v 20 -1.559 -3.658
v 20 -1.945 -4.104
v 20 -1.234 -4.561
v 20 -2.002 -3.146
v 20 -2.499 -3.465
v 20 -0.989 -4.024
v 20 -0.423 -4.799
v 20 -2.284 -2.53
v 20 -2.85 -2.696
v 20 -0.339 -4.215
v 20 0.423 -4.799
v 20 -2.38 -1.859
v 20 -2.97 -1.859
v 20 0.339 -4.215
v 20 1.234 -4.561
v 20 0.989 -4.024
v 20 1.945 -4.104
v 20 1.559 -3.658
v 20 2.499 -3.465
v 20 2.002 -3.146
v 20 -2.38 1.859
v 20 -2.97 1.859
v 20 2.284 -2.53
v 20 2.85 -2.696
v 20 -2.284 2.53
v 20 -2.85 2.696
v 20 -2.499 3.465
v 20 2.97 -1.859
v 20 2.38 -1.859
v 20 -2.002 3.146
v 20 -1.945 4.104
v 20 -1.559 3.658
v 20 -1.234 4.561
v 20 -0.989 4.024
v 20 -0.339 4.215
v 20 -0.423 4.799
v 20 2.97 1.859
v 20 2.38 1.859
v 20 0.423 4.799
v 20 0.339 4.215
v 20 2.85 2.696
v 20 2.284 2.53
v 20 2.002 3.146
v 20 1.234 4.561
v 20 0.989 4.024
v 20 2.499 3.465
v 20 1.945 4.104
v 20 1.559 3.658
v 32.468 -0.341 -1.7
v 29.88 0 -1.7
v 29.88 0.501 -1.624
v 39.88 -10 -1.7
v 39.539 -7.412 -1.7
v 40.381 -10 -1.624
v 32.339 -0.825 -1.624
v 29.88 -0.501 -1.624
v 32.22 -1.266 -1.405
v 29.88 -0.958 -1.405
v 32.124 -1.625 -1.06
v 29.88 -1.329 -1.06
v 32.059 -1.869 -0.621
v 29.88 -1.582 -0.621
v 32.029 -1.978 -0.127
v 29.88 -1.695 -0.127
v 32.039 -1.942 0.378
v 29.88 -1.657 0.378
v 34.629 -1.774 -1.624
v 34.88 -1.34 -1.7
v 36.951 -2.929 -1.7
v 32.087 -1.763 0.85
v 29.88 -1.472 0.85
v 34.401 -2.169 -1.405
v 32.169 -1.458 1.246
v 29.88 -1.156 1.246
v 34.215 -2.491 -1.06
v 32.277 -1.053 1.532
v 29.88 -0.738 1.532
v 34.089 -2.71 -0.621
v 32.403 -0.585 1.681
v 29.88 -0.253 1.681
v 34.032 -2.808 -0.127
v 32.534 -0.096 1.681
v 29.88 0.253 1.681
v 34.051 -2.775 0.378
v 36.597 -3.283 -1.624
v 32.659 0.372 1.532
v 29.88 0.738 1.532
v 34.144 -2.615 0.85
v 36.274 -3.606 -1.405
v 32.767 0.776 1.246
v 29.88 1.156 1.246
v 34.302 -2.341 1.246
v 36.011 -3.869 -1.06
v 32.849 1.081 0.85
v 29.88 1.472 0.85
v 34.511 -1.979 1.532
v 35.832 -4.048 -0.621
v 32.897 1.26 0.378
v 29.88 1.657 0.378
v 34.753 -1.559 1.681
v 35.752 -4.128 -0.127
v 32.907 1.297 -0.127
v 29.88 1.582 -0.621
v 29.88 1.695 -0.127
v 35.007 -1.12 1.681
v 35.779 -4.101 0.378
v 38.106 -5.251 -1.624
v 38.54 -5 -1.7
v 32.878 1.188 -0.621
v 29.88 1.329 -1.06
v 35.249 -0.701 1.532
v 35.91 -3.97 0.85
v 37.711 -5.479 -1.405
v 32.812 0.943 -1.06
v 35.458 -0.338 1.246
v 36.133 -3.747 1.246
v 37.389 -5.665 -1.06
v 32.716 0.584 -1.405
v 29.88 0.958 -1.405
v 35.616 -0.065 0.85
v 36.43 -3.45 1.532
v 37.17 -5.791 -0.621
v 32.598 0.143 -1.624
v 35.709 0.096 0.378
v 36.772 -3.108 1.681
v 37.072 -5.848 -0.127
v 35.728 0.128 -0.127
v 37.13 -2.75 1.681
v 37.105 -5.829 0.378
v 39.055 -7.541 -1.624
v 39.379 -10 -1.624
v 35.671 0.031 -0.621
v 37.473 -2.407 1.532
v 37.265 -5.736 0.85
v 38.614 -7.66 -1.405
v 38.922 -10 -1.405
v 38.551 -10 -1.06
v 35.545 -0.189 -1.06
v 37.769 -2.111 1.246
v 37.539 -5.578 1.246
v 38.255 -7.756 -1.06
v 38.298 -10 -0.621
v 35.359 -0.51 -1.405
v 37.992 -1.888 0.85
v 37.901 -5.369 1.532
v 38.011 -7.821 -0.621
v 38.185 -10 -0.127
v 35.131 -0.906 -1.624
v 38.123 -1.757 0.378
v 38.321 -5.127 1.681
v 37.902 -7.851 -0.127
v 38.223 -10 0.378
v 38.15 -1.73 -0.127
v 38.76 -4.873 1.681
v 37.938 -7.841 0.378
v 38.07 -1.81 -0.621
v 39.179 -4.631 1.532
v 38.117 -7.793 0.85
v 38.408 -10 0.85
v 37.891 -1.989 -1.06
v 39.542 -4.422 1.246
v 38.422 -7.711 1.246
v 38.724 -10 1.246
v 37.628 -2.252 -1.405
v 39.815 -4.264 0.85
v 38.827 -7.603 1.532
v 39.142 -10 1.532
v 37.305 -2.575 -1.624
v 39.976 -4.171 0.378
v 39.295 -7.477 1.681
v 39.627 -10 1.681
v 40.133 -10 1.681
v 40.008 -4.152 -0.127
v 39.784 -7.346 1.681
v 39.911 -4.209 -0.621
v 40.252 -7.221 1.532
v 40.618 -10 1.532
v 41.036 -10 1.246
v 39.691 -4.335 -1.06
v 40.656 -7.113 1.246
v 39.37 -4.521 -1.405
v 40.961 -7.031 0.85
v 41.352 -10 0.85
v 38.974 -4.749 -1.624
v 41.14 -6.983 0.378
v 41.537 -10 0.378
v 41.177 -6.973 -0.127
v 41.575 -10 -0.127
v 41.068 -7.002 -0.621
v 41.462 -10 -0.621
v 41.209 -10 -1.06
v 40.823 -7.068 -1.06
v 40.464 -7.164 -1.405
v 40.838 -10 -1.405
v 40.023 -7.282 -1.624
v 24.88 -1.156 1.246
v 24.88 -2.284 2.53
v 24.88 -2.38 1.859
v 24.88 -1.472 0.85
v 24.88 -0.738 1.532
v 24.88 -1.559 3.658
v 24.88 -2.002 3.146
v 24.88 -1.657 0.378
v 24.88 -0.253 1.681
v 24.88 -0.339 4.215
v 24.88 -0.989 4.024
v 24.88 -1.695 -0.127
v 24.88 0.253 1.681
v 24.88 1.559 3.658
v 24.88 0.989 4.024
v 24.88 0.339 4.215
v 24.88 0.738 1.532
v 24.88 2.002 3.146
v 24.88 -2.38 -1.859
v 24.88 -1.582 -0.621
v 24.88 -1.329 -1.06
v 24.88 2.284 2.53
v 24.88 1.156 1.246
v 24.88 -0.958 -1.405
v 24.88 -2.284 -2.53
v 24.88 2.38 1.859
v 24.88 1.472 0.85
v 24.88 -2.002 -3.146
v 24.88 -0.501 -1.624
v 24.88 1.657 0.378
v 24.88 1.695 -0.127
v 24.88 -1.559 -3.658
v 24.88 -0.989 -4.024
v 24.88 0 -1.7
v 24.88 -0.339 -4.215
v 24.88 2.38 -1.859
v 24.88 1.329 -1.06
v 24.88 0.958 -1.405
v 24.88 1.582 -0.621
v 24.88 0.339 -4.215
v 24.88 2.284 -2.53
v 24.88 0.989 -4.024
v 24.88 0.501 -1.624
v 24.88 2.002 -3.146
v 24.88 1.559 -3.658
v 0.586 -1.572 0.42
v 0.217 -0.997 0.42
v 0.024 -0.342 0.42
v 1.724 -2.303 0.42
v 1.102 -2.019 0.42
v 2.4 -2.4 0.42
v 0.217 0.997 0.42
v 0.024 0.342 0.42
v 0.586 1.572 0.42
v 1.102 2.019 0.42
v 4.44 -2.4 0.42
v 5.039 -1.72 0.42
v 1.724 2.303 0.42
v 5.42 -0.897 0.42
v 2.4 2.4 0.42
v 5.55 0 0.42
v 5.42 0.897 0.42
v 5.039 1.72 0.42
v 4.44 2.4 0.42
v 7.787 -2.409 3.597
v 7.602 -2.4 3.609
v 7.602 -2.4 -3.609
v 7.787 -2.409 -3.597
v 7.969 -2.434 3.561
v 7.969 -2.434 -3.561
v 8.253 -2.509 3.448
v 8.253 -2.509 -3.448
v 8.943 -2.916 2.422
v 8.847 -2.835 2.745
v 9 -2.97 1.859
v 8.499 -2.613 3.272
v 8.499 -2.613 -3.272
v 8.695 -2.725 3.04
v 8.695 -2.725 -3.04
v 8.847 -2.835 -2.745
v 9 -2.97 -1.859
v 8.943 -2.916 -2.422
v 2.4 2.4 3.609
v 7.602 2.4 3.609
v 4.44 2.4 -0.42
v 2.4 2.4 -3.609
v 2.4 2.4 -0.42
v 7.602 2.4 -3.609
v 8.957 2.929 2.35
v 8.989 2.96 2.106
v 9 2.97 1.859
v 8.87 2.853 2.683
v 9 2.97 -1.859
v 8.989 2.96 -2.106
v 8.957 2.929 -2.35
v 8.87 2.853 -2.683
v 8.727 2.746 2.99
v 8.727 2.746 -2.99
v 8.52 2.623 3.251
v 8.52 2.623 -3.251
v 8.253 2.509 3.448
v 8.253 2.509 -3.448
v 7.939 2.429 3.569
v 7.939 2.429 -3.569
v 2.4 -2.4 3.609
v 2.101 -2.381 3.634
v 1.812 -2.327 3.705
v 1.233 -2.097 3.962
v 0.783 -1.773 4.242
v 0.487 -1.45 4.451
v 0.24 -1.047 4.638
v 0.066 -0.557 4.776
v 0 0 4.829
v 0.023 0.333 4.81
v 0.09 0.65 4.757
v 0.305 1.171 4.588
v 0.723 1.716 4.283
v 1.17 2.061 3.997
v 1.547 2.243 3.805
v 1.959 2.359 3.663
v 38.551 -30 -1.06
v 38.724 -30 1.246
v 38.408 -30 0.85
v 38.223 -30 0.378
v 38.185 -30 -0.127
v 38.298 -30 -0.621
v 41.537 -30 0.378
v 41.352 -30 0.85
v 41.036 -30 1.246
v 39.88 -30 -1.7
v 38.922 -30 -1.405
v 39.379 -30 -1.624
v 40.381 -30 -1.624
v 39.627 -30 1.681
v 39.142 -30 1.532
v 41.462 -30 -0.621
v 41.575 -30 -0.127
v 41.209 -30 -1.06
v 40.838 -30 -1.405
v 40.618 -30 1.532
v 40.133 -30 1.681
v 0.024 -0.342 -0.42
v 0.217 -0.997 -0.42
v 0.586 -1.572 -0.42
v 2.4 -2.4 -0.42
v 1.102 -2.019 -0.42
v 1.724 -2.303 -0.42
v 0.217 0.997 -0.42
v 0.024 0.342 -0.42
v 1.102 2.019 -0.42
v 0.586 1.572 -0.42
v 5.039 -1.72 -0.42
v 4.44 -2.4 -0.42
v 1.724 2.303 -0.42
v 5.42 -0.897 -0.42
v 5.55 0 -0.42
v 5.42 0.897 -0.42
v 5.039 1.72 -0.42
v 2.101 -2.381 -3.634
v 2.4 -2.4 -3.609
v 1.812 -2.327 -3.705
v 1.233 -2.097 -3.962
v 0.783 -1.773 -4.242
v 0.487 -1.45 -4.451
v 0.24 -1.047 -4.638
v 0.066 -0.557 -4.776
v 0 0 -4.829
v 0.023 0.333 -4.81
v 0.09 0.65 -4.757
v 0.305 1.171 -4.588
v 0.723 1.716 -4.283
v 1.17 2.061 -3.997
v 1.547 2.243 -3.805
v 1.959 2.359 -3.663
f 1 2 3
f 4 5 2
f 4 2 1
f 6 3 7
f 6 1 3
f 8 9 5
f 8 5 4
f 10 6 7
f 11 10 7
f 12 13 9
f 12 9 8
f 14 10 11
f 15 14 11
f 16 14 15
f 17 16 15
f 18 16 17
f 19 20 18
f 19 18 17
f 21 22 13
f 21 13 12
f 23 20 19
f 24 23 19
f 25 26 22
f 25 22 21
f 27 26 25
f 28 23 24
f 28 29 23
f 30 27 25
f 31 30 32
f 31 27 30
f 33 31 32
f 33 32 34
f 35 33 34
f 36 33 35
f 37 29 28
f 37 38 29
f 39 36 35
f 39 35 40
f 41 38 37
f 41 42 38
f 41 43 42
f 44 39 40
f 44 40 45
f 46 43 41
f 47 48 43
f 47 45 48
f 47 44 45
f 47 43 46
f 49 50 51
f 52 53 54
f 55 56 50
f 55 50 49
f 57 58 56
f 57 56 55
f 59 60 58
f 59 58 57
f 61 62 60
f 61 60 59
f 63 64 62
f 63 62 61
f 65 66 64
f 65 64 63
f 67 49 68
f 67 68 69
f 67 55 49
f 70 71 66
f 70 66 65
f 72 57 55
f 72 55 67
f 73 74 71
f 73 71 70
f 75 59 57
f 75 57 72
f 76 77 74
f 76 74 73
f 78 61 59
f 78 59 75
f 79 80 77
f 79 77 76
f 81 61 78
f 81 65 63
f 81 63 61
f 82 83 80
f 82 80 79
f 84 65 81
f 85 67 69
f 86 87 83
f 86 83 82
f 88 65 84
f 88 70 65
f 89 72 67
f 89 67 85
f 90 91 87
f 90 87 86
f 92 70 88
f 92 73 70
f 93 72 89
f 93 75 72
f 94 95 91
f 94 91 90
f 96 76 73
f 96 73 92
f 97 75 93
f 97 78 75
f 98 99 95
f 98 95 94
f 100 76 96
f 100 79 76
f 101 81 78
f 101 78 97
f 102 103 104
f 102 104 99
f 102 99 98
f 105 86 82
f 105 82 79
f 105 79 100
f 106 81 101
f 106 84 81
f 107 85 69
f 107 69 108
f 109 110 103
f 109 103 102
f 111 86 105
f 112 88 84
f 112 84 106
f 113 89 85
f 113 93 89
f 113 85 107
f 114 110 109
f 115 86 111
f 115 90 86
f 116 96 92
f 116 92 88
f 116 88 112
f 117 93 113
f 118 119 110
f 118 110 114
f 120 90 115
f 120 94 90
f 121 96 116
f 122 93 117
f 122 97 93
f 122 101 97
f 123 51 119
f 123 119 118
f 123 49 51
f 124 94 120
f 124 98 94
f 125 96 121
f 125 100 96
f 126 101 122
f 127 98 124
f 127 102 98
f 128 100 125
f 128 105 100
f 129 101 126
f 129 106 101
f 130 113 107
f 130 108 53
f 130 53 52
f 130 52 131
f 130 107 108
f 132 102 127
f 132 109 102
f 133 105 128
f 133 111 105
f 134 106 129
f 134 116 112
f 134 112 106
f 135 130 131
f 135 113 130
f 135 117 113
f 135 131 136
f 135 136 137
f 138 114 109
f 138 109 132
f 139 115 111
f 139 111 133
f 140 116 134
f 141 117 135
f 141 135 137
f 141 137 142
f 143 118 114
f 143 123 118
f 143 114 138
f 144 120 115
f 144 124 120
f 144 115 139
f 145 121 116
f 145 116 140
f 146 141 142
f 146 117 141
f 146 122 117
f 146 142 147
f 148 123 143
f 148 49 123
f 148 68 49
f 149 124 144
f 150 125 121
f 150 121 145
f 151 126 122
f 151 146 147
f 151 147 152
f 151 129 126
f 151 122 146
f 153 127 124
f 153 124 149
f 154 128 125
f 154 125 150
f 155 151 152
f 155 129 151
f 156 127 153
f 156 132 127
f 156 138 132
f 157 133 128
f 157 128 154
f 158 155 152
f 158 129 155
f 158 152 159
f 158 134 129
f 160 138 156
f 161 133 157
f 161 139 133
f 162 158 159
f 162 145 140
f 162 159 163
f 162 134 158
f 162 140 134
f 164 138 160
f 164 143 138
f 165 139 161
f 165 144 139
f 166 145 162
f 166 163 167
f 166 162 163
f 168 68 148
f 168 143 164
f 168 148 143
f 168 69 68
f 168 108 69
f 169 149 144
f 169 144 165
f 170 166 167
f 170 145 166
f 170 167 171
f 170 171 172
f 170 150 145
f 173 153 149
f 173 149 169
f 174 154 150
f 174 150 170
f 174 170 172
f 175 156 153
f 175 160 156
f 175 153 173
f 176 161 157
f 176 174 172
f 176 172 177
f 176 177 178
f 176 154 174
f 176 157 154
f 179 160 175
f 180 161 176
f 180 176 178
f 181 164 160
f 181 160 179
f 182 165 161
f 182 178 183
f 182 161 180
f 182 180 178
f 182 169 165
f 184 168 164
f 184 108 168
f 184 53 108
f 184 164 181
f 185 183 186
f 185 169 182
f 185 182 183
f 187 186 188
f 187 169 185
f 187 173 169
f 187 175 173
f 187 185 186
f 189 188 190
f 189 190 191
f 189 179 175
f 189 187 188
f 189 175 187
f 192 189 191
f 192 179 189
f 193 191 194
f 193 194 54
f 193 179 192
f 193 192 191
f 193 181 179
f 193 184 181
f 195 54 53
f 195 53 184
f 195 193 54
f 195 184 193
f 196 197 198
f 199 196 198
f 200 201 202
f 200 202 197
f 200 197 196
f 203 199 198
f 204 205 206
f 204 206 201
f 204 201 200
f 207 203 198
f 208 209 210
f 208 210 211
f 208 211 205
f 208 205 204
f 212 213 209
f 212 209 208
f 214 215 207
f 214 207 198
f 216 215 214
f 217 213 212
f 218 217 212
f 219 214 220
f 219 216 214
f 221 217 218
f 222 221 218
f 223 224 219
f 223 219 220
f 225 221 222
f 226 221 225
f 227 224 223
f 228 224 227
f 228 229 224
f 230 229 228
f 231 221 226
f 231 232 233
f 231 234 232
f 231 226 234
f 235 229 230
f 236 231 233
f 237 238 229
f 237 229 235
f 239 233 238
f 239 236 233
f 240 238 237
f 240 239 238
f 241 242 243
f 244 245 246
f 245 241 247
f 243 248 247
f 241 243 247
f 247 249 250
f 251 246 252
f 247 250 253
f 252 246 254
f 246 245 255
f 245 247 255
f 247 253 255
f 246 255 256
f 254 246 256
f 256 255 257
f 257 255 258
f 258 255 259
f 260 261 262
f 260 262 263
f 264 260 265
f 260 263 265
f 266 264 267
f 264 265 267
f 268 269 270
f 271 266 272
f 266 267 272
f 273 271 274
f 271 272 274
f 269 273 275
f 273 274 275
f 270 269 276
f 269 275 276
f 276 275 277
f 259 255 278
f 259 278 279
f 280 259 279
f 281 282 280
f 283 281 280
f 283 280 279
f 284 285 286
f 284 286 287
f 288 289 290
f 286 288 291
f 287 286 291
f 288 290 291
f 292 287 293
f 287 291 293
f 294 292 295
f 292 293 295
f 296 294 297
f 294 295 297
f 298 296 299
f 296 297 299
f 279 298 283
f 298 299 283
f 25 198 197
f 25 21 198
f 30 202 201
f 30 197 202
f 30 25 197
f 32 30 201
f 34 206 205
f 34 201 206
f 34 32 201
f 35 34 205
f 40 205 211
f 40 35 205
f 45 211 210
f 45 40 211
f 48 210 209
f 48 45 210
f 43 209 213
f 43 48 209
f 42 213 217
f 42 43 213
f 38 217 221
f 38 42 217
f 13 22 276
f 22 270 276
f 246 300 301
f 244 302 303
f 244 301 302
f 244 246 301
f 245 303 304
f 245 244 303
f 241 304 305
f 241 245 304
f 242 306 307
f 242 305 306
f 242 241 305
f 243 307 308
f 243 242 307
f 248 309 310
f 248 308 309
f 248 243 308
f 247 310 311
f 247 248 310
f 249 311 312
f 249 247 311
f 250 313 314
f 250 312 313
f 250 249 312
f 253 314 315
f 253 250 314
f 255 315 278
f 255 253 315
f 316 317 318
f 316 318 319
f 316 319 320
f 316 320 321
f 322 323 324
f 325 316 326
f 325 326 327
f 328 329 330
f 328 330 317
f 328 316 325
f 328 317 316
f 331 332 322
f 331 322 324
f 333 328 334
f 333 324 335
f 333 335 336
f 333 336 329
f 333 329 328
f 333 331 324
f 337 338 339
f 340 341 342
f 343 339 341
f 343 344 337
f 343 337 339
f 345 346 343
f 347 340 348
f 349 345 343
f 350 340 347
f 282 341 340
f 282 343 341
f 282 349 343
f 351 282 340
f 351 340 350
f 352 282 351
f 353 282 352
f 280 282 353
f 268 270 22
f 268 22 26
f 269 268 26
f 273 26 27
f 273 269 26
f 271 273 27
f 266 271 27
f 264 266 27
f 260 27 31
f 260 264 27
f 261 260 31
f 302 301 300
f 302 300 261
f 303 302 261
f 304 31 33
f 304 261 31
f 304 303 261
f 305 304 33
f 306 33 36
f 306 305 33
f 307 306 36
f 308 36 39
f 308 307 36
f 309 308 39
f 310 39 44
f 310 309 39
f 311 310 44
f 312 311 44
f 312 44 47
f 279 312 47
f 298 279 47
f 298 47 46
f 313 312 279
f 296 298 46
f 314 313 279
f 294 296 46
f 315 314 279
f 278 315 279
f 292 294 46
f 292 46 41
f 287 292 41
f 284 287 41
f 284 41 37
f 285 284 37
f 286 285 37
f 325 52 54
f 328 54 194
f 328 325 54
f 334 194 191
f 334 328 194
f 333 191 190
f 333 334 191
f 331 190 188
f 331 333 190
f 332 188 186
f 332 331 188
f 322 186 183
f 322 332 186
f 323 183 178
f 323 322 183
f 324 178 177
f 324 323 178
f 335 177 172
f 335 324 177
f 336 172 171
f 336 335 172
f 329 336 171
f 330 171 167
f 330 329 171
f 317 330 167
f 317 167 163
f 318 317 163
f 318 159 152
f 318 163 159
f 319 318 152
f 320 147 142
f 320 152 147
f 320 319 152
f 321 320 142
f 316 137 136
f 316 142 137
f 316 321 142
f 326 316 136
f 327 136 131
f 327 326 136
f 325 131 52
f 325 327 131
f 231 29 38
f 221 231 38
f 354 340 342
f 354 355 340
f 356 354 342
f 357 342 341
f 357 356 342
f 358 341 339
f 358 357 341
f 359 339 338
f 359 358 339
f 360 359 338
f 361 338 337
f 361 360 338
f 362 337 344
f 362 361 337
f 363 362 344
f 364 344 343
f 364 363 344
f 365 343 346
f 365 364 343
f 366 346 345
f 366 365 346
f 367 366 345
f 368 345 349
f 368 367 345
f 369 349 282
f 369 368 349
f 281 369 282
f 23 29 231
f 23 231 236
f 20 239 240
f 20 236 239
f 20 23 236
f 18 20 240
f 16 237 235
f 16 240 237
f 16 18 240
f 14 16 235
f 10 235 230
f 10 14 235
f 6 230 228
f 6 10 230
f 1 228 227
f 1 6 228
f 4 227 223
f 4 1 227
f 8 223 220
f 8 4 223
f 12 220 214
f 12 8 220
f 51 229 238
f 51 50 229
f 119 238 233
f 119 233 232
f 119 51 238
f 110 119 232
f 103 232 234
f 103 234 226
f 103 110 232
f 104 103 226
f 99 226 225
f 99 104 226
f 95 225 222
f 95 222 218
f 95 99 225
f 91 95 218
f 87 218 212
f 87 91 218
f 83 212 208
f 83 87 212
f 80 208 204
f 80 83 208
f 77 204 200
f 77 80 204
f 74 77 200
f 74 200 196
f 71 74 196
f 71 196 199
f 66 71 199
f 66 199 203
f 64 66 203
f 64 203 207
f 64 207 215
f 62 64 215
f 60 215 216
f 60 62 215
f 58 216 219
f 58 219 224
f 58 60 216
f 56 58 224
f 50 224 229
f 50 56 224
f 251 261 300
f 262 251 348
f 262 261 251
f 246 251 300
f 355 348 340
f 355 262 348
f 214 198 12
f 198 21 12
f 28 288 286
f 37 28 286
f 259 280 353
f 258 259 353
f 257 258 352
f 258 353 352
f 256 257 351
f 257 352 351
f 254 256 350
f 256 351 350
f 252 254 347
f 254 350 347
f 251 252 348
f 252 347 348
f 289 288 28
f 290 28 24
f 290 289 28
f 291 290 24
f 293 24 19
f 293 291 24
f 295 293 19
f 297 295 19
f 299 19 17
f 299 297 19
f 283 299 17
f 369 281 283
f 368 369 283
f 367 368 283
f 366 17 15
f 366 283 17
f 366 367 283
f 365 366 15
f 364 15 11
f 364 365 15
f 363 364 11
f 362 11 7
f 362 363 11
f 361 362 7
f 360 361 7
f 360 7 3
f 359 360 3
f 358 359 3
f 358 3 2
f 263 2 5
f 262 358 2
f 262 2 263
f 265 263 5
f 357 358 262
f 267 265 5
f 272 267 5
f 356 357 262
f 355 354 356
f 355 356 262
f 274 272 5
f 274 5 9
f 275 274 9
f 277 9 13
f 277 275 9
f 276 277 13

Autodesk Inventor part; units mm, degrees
ref_plane "YZ Plane" through (0, 0, 0) normal (1, 0, 0) x (0, 1, 0)
ref_plane "XZ Plane" through (0, 0, 0) normal (0, 1, 0) x (-1, 0, 0)
ref_plane "XY Plane" through (0, 0, 0) normal (0, 0, 1) x (1, 0, 0)
sketch "草圖1" plane through (0, 0, 0) normal (1, 0, 0) x (0, 1, 0)
  line L0 (-2.97, -1.859) -> (2.97, -1.859)
  line L1 (2.97, -1.859) -> (2.97, 1.859)
  line L2 (2.97, 1.859) -> (-2.97, 1.859)
  line L3 (-2.97, 1.859) -> (-2.97, -1.859)
  line L4 (-2.97, -1.859) -> (2.97, 1.859) construction
  line L5 (2.97, -1.859) -> (-2.97, 1.859) construction
  circle A0 centre (0, 1.859) radius 2.97
  circle A1 centre (0, -1.859) radius 2.97
  line L6 (-2.2651, -3.78) -> (-2.2651, 3.78) construction
  point P0 (0, 0)
  point P1 (-2.97, 1.859)
  dimension "d0" = 7.56
  dimension "d1" = 5.94
extrude "擠出1" add sketch "草圖1" along normal blind 20
sketch "草圖2" plane through (0, 0, 0) normal (0, 0, 1) x (1, 0, 0)
  line L0 (0, 2.4) -> (9, 2.4)
  line L1 (9, 2.4) -> (9, -2.4)
  line L2 (9, -2.4) -> (0, -2.4)
  line L3 (0, -2.4) -> (0, 2.4)
  line L4 (0, -2.97) -> (0, 2.97) projected
  circle A0 centre (2.4, 0) radius 2.4
  line L5 (9, 5) -> (20, 5)
  line L6 (20, 5) -> (20, -5)
  line L7 (20, -5) -> (9, -5)
  line L8 (9, -5) -> (9, 5)
  line L9 (0, -2.97) -> (0, 2.97) projected
  line L10 (0, 2.97) -> (20, 2.97) projected
  line L11 (20, -2.97) -> (20, 2.97) projected
  line L12 (0, -2.97) -> (20, -2.97) projected
  arc A1 (7.6018, 2.4) -> (9, 2.97) centre (7.6018, 4.4) ccw
  arc A2 (9, -2.97) -> (7.6018, -2.4) centre (7.6018, -4.4) ccw
  point P0 (0, 0)
  point P1 (0, 0)
  point P2 (9, 0)
  point P3 (2.4, 2.4)
  point P4 (2.4, -2.4)
  dimension "d4" = 4.8
  dimension "d5" = 9
  dimension "d6" = 2
  dimension "d7" = 2
extrude "擠出2" cut sketch "草圖2" along normal mid plane 20 contours A1 L8 L0 | L0 L1 L2 A0 | L8 L10 L6 L12 L1 | A0 | L8 L5 L6 L10 | L8 A2 L2 | L12 L6 L7 L8 keep common part
sketch "草圖3" plane through (0, 0, 0) normal (0, 0, 1) x (1, 0, 0)
  line L0 (-0.1991, -1.7797) -> (-0.0573, 1.9709) projected
  arc A0 (-0.1991, -1.7797) -> (-0.0573, 1.9709) centre (2.4, 0) ccw projected
  point P0 (0, 0)
extrude "擠出3" cut sketch "草圖3" along normal mid plane 0.84
sketch "草圖4" plane through (20, 0, 0) normal (1, 0, 0) x (0, 0, -1)
  line L0 (1.859, 2.97) -> (-1.859, 2.97) projected
  arc A0 (-1.859, 2.97) -> (-1.859, -2.97) centre (-1.859, 0) ccw projected
  line L1 (-1.859, -2.97) -> (1.859, -2.97) projected
  arc A1 (1.859, -2.97) -> (1.859, 2.97) centre (1.859, 0) ccw projected
  line L2 (1.859, 2.38) -> (-1.859, 2.38)
  arc A2 (-1.859, 2.38) -> (-1.859, -2.38) centre (-1.859, 0) ccw
  line L3 (-1.859, -2.38) -> (1.859, -2.38)
  arc A3 (1.859, -2.38) -> (1.859, 2.38) centre (1.859, 0) ccw
  point P0 (0, 0)
  dimension "d14" = 0.59
extrude "擠出4" add sketch "草圖4" along normal blind 4.88 contours A3 L3 A2 L2
sketch "草圖5" plane through (24.88, 0, 0) normal (1, 0, 0) x (0, 0, -1)
  circle A0 centre (0, 0) radius 1.7
  dimension "d17" = 3.4
sketch "草圖6" plane through (0, 0, 0) normal (0, 0, 1) x (1, 0, 0)
  line L0 (24.88, -1.7) -> (24.88, 1.7) projected
  line L1 (24.88, 0) -> (29.88, 0)
  arc A0 (39.88, -10) -> (29.88, 0) centre (29.88, -10) ccw
  line L2 (39.88, -10) -> (39.88, -30)
  point P0 (0, 0)
  dimension "d18" = 5
  dimension "d19" = 10
  dimension "d20" = 20
sweep "掃掠1" add profiles "草圖5" path "草圖6" path curves L1 A0 L2
properties part number "基座"
